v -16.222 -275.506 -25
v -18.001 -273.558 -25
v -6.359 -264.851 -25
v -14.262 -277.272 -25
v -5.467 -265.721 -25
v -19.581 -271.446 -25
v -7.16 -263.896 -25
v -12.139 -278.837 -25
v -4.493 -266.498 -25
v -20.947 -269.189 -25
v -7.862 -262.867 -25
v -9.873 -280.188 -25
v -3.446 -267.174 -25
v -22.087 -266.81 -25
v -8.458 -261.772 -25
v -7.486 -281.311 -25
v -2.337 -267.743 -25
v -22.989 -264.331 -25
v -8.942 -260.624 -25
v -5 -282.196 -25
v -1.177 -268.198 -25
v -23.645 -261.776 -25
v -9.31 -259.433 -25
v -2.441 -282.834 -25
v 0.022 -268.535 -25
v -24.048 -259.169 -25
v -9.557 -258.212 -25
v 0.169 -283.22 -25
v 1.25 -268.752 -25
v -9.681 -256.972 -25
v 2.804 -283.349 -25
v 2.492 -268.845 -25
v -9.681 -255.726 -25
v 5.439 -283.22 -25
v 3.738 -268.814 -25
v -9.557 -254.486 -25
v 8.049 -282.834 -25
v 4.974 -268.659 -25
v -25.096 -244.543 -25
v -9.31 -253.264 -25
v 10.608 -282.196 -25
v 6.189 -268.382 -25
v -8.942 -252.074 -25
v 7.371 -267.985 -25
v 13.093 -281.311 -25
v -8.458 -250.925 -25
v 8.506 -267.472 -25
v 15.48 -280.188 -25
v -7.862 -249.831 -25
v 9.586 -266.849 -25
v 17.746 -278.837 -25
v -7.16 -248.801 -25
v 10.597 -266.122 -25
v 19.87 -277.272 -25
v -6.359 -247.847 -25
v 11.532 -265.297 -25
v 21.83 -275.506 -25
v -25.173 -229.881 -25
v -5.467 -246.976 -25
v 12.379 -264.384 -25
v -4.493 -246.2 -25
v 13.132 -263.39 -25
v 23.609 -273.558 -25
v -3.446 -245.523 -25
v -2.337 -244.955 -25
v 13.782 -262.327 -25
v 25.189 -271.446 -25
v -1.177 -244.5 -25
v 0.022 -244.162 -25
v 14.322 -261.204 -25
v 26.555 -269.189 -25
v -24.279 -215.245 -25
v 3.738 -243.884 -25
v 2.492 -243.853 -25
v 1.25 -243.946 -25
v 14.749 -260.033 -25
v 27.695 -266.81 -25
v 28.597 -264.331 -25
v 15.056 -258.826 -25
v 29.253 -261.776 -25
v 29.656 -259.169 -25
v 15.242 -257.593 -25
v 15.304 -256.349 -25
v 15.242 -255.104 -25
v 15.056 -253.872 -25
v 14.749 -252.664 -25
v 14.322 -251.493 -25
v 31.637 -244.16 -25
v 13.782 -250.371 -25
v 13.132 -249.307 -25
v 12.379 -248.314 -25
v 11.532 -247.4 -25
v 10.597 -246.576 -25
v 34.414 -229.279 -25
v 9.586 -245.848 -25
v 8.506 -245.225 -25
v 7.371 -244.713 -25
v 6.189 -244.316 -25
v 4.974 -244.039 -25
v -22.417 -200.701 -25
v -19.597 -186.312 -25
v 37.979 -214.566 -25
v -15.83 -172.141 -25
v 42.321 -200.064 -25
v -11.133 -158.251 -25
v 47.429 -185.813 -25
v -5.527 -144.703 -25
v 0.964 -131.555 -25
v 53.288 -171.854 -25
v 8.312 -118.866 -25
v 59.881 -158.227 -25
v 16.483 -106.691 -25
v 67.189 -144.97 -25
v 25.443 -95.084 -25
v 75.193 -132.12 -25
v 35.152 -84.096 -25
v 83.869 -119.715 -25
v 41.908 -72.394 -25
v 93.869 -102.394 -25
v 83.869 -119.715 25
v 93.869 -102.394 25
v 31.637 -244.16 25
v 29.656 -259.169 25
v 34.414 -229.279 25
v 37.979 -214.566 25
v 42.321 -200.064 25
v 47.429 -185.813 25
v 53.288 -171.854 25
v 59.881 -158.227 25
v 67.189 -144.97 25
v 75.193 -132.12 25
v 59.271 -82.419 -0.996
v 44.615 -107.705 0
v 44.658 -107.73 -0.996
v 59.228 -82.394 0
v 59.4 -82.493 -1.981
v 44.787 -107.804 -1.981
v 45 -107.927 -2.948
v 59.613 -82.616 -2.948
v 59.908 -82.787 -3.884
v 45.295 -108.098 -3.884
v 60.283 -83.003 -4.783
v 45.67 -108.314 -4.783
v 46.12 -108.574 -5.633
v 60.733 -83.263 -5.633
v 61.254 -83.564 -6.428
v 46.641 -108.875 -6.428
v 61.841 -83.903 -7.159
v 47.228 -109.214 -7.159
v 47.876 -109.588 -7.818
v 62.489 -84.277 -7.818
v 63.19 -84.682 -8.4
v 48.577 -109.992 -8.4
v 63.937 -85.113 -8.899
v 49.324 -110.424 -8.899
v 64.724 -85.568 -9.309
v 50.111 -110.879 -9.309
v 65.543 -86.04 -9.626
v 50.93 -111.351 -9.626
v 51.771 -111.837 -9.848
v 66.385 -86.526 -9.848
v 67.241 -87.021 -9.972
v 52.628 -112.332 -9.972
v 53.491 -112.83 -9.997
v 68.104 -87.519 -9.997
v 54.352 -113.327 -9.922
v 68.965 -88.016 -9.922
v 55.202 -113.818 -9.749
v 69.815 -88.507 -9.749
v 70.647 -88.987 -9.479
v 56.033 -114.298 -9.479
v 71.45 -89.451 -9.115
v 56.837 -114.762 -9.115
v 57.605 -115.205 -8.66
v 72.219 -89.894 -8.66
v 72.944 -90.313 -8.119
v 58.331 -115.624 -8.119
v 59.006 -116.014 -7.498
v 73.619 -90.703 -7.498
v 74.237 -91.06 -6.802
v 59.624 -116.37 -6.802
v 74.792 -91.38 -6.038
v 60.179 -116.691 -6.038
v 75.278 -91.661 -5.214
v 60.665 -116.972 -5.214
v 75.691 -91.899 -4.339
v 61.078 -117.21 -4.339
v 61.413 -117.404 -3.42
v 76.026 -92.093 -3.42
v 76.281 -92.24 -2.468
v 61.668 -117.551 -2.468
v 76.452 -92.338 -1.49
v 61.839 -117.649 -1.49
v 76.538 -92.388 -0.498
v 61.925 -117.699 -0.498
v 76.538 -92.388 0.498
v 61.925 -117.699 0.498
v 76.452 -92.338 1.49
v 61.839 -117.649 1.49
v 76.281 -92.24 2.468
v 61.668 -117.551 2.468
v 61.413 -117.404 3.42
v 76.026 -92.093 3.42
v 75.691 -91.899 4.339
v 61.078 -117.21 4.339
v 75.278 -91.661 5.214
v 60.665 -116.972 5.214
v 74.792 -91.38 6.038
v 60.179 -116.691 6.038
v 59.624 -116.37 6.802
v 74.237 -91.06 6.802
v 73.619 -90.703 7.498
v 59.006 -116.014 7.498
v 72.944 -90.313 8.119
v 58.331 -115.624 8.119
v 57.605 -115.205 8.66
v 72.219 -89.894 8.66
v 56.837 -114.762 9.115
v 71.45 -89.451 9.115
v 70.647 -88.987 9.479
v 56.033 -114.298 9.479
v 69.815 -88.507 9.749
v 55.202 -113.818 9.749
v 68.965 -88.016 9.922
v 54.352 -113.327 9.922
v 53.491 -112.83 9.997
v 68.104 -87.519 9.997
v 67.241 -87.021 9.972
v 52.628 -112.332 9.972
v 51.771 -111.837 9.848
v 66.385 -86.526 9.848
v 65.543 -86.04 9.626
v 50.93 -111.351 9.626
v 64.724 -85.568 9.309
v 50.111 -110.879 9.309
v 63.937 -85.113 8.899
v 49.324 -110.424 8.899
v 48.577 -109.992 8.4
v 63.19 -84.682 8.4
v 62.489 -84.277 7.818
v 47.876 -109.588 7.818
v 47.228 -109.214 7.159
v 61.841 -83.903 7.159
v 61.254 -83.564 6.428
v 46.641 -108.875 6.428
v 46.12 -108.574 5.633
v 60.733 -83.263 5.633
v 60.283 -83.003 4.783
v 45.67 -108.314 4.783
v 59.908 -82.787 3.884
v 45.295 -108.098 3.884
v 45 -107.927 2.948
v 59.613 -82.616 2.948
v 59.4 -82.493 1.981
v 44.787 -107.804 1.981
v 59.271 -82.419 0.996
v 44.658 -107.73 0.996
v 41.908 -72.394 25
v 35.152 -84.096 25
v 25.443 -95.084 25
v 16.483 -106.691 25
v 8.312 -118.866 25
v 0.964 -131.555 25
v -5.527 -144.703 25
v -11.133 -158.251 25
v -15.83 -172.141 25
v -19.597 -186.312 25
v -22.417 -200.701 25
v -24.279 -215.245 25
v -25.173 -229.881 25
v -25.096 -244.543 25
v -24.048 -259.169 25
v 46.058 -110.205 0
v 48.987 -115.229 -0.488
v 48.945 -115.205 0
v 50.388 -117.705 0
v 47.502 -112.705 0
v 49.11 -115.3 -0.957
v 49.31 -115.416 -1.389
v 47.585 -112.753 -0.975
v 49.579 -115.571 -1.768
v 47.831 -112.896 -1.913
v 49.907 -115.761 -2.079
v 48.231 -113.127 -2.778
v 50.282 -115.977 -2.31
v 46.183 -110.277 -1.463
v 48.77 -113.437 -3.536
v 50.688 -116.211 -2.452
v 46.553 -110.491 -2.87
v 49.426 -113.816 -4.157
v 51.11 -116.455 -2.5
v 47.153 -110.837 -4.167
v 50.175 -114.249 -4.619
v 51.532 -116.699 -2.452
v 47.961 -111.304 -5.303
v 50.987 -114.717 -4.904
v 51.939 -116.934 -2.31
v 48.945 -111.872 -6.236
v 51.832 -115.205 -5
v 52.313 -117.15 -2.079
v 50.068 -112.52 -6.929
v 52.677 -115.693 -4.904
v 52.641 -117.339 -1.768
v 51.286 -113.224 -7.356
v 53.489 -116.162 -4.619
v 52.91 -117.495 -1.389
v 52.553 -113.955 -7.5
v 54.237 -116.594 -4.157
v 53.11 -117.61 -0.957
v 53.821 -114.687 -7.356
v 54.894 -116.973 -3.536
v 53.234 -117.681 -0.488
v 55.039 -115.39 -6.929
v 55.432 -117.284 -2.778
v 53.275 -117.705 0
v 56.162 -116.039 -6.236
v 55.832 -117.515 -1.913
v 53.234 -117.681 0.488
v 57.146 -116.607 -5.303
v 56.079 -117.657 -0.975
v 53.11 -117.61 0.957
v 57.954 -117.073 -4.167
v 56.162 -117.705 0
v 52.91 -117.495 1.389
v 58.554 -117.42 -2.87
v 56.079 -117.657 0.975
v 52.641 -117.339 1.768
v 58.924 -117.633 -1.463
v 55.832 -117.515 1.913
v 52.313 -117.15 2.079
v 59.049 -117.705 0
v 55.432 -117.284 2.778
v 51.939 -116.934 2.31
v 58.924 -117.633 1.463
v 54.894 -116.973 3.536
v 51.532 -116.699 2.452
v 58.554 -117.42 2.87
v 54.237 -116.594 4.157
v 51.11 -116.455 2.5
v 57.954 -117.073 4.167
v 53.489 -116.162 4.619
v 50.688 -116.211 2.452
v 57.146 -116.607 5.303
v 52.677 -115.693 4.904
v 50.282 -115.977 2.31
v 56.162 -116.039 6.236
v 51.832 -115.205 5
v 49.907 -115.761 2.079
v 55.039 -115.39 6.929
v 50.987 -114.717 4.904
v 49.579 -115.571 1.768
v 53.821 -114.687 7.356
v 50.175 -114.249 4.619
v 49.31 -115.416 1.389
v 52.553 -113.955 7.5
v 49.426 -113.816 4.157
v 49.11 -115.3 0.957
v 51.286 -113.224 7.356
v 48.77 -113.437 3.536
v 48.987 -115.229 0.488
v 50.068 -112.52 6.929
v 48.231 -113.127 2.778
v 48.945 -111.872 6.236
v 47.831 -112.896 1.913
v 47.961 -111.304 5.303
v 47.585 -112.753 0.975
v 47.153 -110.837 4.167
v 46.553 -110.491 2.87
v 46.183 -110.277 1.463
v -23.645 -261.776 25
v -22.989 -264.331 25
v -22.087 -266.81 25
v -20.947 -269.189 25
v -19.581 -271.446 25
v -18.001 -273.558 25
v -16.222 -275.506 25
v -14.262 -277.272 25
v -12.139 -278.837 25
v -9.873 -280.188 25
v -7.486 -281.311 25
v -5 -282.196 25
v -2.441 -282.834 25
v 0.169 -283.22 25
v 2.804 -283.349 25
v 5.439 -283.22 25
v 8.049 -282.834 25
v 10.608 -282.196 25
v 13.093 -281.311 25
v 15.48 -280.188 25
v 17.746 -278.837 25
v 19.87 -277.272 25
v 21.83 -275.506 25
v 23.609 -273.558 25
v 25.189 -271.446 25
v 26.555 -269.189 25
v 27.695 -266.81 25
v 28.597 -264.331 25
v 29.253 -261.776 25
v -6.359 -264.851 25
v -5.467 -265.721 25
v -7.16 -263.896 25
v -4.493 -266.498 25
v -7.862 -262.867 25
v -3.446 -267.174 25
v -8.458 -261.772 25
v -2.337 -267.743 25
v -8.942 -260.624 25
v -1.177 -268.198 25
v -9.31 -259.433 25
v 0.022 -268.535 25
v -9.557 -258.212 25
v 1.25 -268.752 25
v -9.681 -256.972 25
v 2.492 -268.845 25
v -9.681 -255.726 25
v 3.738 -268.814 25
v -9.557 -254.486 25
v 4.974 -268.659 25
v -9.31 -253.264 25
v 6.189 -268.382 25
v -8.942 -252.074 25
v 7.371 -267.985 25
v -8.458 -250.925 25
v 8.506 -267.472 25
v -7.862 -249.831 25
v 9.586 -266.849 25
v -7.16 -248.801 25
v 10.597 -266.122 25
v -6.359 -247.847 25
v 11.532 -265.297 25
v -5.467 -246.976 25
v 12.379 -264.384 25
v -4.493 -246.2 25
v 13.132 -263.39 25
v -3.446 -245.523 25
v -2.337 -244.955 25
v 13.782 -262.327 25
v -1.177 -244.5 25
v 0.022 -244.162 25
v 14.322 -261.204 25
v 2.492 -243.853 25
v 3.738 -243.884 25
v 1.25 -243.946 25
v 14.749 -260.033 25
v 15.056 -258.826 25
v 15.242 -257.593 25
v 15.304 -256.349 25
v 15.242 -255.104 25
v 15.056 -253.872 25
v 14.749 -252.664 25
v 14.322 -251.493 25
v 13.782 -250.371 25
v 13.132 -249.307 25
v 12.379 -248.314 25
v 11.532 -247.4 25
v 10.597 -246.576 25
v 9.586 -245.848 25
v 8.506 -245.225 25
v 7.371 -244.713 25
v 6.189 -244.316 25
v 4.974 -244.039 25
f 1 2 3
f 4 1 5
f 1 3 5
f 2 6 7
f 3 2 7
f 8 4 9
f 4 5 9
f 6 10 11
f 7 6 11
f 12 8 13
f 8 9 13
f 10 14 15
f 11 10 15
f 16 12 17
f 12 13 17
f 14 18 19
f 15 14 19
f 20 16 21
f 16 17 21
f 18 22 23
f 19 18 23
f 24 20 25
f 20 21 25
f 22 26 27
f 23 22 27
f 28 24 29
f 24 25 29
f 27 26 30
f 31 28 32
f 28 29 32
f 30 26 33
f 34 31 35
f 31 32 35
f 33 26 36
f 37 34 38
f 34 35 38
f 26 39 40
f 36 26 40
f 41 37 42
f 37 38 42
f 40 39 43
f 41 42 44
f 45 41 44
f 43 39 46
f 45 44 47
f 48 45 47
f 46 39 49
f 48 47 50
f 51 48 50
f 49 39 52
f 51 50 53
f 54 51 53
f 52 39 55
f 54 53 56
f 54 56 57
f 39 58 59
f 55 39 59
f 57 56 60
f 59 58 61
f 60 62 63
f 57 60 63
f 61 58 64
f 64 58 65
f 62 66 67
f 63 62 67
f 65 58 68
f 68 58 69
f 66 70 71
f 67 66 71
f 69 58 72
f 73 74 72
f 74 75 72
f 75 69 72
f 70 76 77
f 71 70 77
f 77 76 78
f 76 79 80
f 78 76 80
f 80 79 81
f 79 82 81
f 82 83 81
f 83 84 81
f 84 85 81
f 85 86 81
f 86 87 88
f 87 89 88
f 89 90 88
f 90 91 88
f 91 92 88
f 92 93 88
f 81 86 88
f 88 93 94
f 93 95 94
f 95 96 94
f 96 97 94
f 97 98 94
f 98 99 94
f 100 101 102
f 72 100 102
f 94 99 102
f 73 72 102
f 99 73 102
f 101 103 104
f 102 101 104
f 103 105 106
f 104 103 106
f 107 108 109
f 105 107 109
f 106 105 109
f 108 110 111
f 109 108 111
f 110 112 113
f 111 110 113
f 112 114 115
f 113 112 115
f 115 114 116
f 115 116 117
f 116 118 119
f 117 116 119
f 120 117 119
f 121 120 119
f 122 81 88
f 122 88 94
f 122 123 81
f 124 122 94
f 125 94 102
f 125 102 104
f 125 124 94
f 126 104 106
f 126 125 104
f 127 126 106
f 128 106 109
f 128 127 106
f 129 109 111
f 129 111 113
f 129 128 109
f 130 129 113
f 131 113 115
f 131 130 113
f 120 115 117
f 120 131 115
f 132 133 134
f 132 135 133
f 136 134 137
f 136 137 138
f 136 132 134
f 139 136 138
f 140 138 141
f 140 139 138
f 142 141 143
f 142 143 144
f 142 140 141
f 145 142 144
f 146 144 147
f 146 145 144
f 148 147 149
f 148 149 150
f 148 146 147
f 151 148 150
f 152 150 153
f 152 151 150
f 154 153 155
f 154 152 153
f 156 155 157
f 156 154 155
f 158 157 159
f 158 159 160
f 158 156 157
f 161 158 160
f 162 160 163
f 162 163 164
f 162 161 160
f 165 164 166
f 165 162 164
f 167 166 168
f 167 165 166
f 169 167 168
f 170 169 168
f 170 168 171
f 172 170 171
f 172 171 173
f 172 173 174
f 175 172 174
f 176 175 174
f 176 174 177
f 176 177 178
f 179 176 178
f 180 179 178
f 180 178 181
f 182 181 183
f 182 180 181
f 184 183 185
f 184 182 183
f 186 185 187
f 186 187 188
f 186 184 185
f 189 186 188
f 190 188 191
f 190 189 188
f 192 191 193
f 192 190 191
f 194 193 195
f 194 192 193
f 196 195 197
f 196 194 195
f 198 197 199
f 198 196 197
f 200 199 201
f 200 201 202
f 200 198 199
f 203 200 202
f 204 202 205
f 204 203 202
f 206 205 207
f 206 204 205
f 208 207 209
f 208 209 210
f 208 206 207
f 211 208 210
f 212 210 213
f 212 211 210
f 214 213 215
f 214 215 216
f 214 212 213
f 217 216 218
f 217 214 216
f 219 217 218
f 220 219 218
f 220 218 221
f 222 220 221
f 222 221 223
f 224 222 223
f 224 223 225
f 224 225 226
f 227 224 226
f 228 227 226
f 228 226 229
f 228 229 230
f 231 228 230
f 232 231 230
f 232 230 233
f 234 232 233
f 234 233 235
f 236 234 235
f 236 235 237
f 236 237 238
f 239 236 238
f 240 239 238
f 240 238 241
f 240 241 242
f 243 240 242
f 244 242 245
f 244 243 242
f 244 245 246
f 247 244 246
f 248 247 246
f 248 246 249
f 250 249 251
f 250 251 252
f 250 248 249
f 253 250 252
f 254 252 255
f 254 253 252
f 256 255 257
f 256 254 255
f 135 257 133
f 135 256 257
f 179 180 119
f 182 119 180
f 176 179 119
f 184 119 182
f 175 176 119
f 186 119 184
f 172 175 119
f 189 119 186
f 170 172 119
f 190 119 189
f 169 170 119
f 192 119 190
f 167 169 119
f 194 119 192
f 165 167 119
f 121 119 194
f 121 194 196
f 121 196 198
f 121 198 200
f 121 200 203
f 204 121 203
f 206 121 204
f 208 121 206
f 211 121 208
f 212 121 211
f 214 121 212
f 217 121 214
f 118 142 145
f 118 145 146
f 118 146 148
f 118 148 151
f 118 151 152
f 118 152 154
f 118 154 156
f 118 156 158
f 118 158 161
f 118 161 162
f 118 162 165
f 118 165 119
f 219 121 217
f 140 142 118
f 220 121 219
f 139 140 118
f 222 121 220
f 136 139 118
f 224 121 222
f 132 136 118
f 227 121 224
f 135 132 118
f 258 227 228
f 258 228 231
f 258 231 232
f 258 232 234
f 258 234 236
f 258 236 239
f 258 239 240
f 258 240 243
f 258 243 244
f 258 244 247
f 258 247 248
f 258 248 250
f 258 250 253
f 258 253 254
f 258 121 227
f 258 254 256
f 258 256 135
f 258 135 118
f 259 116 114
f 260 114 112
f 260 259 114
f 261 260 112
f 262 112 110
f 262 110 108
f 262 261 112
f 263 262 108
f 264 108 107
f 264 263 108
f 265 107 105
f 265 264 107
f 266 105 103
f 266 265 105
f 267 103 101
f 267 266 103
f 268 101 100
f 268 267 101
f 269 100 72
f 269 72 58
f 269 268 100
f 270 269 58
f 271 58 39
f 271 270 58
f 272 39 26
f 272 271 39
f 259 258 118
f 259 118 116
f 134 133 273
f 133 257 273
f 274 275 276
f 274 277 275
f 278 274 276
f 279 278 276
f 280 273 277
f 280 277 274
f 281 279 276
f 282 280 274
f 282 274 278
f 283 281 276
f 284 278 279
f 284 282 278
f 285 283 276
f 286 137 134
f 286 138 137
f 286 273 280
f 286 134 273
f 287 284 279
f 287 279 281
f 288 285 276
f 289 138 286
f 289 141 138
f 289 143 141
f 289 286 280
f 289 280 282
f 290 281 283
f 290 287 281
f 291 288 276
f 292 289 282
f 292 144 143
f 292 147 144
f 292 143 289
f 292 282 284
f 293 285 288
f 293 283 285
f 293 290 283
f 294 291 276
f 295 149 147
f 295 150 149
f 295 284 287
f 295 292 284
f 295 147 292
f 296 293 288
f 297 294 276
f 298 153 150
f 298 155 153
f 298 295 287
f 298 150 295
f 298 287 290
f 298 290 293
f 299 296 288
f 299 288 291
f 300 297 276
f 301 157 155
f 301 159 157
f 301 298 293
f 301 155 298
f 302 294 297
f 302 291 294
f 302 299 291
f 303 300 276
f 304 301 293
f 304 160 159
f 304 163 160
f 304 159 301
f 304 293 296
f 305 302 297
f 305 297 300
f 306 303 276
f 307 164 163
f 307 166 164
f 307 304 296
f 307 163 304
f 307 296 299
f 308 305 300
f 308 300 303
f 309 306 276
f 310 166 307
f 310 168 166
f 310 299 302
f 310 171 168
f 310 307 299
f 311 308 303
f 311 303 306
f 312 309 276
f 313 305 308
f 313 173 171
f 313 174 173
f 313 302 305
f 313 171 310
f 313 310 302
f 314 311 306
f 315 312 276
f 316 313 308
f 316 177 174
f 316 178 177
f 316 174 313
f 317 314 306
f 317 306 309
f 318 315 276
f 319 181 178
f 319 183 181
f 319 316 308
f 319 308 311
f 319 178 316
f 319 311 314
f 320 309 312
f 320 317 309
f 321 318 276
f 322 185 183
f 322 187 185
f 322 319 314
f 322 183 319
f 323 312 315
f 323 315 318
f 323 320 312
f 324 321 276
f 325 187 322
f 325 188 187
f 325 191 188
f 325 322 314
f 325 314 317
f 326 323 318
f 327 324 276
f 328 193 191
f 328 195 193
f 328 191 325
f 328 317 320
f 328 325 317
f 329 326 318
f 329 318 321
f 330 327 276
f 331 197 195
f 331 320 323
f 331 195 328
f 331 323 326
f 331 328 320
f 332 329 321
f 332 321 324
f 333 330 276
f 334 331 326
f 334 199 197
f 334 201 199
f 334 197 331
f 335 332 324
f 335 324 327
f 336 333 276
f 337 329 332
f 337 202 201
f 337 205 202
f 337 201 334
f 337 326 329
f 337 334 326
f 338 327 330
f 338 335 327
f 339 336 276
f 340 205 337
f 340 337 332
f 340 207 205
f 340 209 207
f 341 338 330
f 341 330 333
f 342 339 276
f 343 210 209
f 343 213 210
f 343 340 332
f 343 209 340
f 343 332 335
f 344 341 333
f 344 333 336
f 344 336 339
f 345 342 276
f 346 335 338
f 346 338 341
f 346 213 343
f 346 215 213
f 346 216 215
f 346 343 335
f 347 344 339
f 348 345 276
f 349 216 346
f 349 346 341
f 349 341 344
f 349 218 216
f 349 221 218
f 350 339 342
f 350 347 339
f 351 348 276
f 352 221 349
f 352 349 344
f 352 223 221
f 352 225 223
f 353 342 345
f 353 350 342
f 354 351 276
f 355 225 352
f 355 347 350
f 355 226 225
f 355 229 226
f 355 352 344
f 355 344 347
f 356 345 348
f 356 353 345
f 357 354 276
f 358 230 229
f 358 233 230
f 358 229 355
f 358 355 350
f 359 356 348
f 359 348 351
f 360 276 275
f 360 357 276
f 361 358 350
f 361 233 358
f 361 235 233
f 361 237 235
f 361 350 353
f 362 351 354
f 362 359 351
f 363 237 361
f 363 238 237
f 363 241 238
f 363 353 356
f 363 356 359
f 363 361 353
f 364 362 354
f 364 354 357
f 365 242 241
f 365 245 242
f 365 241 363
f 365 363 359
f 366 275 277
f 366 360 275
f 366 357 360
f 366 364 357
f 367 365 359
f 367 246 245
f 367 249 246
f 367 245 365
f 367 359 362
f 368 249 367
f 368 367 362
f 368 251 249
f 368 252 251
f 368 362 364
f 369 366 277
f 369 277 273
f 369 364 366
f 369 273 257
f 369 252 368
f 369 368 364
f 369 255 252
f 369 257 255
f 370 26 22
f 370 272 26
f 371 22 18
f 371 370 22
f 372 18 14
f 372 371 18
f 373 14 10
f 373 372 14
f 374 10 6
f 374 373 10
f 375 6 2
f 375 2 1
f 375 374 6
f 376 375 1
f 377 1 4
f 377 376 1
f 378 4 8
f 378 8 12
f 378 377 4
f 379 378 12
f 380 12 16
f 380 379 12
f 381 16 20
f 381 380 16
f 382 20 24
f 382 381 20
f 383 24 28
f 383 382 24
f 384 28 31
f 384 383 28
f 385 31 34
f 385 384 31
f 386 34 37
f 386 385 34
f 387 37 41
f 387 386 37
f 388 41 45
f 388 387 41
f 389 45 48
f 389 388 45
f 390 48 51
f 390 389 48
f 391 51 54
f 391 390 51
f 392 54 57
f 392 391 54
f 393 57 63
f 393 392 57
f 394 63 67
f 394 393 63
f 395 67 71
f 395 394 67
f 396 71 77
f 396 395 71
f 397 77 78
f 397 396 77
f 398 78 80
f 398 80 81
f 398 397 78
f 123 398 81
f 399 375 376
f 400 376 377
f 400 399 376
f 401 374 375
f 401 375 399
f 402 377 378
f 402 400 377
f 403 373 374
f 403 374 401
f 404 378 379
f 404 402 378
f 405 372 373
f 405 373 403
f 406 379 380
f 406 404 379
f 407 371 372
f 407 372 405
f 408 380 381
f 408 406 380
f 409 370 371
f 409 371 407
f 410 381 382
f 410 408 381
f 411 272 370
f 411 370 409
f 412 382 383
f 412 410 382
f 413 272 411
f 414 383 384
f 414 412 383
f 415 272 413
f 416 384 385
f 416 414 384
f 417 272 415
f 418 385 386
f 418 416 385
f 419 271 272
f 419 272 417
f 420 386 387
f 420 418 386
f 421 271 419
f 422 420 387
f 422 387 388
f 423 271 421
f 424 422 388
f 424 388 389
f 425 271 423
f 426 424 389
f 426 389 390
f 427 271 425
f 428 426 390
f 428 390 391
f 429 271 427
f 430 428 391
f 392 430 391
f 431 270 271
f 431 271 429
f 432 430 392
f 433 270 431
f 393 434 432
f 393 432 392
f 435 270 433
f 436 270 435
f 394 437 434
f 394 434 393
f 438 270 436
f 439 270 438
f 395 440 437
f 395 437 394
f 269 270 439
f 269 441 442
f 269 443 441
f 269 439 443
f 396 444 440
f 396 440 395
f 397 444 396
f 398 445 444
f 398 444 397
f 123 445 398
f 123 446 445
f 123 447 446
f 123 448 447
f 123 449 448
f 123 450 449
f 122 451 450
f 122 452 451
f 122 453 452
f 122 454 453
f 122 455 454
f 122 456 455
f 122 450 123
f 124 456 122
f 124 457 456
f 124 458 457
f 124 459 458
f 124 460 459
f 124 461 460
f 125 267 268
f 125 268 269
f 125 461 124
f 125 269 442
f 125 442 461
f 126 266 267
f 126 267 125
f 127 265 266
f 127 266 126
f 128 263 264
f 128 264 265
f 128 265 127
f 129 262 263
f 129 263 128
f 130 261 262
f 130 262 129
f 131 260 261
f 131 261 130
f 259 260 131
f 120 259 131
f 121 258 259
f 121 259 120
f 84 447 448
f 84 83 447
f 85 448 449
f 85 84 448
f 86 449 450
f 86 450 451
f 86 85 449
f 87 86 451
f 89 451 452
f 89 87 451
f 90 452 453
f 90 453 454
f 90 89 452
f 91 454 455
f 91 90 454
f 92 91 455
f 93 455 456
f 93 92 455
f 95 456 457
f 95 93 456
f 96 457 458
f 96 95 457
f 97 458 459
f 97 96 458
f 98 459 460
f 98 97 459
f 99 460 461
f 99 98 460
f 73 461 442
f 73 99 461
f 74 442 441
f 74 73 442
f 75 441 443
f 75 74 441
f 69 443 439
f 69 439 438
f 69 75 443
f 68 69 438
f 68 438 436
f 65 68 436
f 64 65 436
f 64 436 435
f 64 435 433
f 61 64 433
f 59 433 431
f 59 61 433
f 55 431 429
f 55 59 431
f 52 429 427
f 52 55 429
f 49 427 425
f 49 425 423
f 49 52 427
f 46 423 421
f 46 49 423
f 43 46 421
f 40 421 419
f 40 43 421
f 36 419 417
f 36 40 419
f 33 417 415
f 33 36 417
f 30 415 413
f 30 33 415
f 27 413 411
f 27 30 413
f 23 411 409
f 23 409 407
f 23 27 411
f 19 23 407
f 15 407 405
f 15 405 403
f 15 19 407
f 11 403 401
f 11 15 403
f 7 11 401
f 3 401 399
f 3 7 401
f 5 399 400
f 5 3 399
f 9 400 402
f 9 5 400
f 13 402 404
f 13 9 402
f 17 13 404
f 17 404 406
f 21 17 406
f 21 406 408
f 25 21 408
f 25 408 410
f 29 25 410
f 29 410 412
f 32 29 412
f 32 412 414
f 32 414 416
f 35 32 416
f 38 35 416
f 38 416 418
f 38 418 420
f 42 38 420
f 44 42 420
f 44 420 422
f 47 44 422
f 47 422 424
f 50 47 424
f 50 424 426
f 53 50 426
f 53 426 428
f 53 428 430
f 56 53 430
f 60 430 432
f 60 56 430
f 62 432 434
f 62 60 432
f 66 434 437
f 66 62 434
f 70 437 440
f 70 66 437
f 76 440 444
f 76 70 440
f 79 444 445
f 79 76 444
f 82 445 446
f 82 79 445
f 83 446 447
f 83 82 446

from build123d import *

# Parameters (mm, degrees)
ESQUISSE1_R        = 12.5
BOSS_EXTRU_1_DEPTH = 25


with BuildPart() as part:
    # Esquisse1 → Boss.-Extru.1 (new, symmetric)
    with BuildSketch(Plane.XY):
        with BuildLine():
            Line((83.869153377, -119.714830661), (93.869153377, -102.394322585))
            Line((93.869153377, -102.394322585), (41.907629149, -72.394322585))
            Line((41.907629149, -72.394322585), (35.151654556, -84.096013836))
            ThreePointArc((35.151654556, -84.096013836), (-13.596595867, -165.15744642), (-24.048474301, -259.168647929))
            ThreePointArc((-24.048474301, -259.168647929), (2.80386651, -283.348755554), (29.65620732, -259.168647929))
            ThreePointArc((29.65620732, -259.168647929), (47.428924329, -185.813223264), (83.869153377, -119.714830661))
        make_face()
        with Locations((2.80386651, -256.348755554)):
            Circle(ESQUISSE1_R, mode=Mode.SUBTRACT)
    extrude(amount=BOSS_EXTRU_1_DEPTH, both=True)

    # Esquisse3 → Enlèvement de matière-Révolution1 (revolve, cut)
    with BuildSketch(Plane.XY):
        Polygon((67.888391263, -87.394322585), (50.388391263, -117.705211717), (44.614888571, -107.705211717), (59.228137225, -82.394322585), align=None)
    revolve(axis=Axis((67.888391263, -87.394322585, 0), (-0.5000000000000014, -0.8660254037844379, 0)), mode=Mode.SUBTRACT)


solid = part.part
